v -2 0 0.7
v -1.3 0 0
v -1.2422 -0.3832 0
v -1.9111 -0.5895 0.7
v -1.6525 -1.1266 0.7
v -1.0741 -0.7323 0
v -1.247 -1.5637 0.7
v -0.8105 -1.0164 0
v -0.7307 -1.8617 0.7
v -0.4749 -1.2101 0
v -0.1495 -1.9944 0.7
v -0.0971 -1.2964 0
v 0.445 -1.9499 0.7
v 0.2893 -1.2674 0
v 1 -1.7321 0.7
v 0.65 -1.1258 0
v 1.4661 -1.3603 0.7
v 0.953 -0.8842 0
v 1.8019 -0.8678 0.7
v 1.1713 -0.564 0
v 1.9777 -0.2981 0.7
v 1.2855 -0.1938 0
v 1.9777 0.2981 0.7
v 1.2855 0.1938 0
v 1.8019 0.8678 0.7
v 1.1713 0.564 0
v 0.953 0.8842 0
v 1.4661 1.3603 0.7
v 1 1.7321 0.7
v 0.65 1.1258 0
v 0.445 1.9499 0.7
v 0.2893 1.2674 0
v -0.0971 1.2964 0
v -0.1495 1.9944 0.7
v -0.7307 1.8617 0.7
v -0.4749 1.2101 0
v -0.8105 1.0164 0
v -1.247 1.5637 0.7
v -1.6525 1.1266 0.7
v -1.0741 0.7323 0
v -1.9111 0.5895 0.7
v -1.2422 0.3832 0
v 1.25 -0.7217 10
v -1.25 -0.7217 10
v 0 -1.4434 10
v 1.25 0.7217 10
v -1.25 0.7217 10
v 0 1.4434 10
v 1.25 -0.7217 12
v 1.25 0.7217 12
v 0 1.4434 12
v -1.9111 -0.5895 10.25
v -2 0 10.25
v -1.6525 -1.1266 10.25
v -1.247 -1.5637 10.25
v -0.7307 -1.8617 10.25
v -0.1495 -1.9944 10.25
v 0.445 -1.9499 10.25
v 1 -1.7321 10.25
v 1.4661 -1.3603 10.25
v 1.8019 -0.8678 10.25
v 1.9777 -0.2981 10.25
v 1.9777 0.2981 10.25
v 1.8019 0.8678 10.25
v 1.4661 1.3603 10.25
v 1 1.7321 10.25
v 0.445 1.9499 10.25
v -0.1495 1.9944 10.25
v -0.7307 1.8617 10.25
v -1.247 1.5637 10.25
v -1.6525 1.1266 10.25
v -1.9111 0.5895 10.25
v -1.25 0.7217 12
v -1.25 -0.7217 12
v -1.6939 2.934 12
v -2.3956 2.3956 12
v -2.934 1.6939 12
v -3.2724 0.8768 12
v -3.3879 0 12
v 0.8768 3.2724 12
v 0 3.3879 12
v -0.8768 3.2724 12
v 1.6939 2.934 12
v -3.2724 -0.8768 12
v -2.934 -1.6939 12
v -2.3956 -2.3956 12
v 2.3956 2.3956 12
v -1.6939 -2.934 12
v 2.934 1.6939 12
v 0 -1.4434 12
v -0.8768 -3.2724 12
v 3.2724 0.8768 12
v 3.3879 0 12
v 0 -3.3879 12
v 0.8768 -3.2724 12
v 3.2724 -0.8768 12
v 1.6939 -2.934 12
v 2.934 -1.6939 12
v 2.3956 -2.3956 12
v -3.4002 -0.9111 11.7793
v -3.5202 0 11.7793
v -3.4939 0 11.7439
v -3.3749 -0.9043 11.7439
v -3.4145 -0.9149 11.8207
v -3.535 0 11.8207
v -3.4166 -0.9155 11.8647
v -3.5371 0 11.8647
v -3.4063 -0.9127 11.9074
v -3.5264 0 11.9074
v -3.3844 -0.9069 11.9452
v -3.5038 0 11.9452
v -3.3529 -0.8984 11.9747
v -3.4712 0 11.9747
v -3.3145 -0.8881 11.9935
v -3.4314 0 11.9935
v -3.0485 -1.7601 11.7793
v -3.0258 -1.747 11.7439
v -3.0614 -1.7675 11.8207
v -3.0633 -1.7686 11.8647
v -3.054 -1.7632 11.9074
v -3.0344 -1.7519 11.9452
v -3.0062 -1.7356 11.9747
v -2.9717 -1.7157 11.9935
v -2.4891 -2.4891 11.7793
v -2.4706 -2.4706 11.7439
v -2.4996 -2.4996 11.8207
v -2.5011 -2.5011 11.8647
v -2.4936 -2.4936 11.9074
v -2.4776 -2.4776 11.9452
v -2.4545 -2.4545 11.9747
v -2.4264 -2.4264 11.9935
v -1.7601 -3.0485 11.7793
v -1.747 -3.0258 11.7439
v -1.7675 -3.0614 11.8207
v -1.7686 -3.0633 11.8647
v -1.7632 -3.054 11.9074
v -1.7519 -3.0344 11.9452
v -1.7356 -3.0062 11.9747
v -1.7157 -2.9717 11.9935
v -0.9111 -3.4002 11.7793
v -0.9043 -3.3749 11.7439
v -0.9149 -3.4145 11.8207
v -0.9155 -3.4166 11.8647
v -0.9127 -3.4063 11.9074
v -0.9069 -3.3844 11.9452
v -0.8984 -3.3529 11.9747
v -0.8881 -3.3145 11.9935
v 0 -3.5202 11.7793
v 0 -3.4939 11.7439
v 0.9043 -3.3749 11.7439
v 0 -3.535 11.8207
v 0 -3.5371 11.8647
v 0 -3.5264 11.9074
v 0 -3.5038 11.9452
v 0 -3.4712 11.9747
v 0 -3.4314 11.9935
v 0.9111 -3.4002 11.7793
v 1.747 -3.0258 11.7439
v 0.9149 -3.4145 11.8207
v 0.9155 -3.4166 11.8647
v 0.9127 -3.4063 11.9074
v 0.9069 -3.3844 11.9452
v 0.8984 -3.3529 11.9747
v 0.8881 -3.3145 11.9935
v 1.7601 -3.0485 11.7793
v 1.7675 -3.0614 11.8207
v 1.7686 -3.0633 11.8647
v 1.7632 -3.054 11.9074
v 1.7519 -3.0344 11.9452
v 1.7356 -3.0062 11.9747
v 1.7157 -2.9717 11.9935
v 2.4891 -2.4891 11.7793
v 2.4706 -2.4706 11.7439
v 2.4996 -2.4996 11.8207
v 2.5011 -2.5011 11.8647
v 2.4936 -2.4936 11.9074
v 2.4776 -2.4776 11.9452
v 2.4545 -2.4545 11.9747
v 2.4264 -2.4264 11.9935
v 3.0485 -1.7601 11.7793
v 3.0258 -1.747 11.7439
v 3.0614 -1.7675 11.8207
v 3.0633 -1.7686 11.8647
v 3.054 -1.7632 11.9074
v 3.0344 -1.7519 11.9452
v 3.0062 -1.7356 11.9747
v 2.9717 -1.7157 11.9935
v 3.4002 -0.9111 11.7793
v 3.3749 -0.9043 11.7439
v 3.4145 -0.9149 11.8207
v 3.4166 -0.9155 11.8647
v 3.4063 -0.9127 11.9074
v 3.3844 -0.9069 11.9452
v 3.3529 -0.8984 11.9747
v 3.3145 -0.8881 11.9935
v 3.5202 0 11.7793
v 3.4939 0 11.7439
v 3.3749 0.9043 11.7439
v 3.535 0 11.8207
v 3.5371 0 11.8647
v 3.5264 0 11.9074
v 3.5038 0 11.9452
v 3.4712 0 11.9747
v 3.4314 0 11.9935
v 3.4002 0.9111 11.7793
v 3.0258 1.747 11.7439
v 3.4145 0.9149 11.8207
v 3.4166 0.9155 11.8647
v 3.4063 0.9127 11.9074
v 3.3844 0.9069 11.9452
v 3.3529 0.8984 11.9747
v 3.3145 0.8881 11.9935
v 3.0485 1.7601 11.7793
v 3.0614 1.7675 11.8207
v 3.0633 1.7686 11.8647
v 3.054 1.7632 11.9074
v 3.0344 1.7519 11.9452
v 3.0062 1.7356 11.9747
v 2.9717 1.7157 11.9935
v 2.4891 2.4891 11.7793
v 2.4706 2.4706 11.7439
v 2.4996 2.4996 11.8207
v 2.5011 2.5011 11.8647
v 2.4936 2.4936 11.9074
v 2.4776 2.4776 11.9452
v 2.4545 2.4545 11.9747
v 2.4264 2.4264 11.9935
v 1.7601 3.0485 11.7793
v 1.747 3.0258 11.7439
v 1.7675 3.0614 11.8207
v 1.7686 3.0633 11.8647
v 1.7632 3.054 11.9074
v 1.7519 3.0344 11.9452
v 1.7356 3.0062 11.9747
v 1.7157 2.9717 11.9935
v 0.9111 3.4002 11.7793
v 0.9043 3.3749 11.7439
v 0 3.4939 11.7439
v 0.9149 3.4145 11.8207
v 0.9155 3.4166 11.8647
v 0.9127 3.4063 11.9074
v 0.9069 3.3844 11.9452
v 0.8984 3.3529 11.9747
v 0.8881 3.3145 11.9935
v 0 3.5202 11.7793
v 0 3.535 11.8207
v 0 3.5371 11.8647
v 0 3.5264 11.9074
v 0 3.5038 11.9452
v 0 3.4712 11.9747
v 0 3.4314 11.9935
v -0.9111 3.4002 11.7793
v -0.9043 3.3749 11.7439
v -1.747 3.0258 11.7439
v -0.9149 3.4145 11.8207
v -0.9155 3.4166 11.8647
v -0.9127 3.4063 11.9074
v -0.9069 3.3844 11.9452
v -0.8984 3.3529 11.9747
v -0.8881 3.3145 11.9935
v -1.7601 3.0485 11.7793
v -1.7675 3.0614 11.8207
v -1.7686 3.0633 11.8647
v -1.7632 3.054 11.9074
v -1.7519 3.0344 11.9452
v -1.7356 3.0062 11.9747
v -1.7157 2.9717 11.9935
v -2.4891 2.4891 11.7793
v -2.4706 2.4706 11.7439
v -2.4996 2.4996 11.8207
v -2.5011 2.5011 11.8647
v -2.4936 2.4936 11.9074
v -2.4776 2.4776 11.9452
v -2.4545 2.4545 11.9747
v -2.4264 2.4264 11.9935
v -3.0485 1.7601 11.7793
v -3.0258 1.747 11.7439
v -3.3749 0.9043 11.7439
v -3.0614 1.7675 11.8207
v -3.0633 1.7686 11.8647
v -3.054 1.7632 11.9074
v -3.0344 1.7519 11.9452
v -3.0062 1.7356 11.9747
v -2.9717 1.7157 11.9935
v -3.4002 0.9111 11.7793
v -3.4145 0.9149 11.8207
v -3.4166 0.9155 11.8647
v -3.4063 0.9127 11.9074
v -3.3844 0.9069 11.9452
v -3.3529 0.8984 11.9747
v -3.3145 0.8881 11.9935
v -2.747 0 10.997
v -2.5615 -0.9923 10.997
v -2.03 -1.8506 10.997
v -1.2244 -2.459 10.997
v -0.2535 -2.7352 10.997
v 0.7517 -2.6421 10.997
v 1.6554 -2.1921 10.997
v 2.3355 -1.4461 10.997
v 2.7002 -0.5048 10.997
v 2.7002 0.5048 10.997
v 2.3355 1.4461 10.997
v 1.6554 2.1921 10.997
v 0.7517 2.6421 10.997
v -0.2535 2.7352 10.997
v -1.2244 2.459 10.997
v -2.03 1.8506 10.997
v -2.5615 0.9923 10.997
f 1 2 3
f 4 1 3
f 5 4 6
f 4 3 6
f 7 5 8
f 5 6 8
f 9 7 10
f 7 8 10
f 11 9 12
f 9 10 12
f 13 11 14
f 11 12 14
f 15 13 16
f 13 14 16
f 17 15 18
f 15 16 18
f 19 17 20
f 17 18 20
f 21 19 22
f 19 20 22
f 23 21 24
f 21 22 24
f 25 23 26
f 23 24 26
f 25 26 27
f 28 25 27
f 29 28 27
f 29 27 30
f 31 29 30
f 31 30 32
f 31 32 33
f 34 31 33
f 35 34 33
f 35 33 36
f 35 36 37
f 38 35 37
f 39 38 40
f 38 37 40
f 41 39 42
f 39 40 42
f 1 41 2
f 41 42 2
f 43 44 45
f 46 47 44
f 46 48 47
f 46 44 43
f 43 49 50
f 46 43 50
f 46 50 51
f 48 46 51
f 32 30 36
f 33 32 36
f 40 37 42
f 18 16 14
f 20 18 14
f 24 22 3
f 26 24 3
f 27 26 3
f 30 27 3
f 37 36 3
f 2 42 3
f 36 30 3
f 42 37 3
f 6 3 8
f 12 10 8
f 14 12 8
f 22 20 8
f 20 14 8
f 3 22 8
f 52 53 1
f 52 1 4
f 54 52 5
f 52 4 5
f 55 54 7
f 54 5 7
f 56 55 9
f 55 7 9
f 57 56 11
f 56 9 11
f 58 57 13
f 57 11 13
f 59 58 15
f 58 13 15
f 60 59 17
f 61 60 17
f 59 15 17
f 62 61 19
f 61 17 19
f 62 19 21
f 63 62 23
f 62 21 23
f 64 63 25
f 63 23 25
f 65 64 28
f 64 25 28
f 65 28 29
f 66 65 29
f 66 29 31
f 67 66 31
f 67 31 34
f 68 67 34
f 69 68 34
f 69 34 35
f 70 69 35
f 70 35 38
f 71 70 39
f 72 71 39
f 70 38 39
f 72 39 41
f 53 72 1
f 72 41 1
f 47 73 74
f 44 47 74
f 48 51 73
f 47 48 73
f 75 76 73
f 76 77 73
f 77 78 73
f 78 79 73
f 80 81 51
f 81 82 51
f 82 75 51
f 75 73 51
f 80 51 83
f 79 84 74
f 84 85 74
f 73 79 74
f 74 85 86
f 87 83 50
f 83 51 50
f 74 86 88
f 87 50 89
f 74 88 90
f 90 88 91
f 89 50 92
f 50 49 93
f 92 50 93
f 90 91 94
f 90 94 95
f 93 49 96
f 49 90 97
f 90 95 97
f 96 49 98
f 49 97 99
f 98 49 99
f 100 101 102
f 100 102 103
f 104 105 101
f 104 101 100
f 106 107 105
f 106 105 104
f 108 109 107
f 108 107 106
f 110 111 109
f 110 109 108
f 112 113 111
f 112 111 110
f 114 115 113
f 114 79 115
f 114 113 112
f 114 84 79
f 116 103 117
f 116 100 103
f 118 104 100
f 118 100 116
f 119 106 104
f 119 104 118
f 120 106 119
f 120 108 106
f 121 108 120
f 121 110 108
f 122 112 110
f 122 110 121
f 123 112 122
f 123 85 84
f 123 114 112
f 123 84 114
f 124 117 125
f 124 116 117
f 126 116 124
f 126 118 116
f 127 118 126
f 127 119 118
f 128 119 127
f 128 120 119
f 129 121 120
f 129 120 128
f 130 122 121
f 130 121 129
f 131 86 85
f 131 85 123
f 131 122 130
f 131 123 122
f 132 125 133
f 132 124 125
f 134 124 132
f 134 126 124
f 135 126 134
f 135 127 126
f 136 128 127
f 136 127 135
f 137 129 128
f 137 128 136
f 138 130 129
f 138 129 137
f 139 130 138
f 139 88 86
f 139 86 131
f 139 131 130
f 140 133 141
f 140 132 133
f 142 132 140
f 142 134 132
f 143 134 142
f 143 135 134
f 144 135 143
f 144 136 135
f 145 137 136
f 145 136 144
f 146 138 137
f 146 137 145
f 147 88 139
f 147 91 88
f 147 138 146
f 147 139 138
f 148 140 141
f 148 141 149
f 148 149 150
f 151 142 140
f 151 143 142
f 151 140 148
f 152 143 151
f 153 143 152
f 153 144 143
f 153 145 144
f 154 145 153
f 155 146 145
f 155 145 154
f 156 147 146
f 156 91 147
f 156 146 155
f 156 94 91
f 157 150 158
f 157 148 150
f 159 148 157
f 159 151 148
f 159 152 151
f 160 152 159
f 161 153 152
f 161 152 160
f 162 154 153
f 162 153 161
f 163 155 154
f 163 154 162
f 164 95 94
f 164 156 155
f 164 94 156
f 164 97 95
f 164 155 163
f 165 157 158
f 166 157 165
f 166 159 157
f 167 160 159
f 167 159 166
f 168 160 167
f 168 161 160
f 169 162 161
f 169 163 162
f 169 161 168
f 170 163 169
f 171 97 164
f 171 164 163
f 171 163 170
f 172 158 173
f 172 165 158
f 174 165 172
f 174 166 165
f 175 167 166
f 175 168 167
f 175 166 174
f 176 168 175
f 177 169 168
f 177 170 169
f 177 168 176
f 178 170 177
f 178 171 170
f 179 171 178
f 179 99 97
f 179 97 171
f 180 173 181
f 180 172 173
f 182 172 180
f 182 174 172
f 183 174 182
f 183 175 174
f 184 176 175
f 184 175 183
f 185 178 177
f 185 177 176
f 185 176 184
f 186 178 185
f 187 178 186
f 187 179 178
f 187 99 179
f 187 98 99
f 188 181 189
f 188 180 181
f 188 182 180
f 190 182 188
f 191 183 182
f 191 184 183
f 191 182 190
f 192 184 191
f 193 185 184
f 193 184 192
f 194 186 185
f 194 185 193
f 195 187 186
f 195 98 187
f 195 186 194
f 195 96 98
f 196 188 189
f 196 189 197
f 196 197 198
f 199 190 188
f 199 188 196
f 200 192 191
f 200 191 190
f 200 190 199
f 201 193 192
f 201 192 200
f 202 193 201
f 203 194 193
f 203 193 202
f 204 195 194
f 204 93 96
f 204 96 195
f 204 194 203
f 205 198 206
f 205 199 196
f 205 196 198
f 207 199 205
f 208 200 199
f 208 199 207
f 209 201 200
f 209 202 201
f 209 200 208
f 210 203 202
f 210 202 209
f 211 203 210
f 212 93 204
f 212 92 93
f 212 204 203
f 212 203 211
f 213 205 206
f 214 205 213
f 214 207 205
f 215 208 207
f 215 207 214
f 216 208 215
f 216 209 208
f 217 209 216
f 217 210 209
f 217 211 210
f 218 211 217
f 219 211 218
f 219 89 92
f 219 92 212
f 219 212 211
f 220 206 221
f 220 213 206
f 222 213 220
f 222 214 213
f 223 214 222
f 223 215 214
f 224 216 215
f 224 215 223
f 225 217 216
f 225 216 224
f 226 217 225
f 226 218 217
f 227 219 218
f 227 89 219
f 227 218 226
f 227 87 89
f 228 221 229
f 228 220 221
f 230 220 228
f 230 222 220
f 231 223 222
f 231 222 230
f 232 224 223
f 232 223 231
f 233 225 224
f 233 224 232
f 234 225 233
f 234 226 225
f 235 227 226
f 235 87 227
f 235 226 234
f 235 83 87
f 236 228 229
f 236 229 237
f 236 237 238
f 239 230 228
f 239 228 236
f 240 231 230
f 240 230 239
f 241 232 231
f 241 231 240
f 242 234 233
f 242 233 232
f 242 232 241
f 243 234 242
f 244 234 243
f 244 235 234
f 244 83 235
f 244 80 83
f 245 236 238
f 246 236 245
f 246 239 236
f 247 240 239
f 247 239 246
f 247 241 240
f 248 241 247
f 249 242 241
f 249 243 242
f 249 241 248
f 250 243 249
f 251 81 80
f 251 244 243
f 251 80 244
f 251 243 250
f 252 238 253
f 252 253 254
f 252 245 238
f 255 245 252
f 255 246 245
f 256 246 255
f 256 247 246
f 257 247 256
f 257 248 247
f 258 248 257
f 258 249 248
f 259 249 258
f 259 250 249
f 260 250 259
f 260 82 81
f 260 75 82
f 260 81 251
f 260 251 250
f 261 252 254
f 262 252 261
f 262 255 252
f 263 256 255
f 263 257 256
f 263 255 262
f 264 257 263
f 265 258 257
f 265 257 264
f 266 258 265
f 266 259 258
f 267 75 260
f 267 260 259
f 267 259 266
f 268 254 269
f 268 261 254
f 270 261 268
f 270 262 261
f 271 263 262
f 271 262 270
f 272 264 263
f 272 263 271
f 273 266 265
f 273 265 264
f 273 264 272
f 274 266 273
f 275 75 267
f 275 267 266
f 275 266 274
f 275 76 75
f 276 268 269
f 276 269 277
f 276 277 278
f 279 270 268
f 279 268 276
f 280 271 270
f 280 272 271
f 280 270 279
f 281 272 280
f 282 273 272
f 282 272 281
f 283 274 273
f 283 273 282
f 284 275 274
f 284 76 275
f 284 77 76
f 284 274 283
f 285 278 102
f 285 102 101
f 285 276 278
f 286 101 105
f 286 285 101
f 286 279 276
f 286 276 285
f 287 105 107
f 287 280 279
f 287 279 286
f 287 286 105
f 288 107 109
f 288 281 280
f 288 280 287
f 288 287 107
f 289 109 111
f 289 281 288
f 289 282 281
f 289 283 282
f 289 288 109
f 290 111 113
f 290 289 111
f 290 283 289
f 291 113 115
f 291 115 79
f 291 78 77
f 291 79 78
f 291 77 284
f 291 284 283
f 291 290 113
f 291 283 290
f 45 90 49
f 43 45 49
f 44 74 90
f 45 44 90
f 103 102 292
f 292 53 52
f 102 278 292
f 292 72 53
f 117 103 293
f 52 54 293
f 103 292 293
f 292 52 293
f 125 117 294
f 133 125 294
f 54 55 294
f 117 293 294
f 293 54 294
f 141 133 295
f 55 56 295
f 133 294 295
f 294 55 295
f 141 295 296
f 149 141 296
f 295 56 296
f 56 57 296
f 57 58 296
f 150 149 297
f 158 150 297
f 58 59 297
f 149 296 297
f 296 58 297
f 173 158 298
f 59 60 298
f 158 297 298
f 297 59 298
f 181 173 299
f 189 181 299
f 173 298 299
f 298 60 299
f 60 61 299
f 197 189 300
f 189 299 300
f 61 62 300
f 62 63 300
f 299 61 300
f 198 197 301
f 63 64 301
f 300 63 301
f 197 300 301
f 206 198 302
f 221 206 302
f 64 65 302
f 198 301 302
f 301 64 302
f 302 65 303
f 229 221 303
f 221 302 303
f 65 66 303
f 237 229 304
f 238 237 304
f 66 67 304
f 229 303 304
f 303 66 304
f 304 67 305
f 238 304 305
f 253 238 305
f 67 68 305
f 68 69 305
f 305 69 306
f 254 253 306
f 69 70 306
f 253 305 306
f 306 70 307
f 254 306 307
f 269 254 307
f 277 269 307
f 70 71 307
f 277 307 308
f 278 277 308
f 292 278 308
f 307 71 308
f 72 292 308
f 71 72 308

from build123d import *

# Parameters (mm, degrees)
F2_SIZE  = 0.7
F4_DEPTH = 2
F5_R     = 0.15


with BuildPart() as f1:
    # F0 (on Front) → F1 (revolve)
    with BuildSketch(Plane.XZ):
        Polygon((-2, 10.25), (-2, 0), (0, 0), (0, 12), (-3.75, 12), align=None)
    revolve(axis=Axis((0, 0, 15.756099), (0, 0, 1)))

    # F2
    f2_edges = [f1.edges().sort_by_distance(p)[0] for p in [
        (2, 0, 0),
    ]]
    chamfer(f2_edges, length=F2_SIZE)

    # F3 (on face) → F4 (cut)
    with BuildSketch(Plane.XY.offset(12)):
        Polygon((-1.25, 0.721688), (-1.25, -0.721688), (0, -1.443376), (1.25, -0.721688), (1.25, 0.721688), (0, 1.443376), align=None)
    extrude(amount=-F4_DEPTH, mode=Mode.SUBTRACT)

    # F5
    f5_edges = [f1.edges().sort_by_distance(p)[0] for p in [
        (3.75, 0, 12),
    ]]
    fillet(f5_edges, radius=F5_R)


solid = f1.part
